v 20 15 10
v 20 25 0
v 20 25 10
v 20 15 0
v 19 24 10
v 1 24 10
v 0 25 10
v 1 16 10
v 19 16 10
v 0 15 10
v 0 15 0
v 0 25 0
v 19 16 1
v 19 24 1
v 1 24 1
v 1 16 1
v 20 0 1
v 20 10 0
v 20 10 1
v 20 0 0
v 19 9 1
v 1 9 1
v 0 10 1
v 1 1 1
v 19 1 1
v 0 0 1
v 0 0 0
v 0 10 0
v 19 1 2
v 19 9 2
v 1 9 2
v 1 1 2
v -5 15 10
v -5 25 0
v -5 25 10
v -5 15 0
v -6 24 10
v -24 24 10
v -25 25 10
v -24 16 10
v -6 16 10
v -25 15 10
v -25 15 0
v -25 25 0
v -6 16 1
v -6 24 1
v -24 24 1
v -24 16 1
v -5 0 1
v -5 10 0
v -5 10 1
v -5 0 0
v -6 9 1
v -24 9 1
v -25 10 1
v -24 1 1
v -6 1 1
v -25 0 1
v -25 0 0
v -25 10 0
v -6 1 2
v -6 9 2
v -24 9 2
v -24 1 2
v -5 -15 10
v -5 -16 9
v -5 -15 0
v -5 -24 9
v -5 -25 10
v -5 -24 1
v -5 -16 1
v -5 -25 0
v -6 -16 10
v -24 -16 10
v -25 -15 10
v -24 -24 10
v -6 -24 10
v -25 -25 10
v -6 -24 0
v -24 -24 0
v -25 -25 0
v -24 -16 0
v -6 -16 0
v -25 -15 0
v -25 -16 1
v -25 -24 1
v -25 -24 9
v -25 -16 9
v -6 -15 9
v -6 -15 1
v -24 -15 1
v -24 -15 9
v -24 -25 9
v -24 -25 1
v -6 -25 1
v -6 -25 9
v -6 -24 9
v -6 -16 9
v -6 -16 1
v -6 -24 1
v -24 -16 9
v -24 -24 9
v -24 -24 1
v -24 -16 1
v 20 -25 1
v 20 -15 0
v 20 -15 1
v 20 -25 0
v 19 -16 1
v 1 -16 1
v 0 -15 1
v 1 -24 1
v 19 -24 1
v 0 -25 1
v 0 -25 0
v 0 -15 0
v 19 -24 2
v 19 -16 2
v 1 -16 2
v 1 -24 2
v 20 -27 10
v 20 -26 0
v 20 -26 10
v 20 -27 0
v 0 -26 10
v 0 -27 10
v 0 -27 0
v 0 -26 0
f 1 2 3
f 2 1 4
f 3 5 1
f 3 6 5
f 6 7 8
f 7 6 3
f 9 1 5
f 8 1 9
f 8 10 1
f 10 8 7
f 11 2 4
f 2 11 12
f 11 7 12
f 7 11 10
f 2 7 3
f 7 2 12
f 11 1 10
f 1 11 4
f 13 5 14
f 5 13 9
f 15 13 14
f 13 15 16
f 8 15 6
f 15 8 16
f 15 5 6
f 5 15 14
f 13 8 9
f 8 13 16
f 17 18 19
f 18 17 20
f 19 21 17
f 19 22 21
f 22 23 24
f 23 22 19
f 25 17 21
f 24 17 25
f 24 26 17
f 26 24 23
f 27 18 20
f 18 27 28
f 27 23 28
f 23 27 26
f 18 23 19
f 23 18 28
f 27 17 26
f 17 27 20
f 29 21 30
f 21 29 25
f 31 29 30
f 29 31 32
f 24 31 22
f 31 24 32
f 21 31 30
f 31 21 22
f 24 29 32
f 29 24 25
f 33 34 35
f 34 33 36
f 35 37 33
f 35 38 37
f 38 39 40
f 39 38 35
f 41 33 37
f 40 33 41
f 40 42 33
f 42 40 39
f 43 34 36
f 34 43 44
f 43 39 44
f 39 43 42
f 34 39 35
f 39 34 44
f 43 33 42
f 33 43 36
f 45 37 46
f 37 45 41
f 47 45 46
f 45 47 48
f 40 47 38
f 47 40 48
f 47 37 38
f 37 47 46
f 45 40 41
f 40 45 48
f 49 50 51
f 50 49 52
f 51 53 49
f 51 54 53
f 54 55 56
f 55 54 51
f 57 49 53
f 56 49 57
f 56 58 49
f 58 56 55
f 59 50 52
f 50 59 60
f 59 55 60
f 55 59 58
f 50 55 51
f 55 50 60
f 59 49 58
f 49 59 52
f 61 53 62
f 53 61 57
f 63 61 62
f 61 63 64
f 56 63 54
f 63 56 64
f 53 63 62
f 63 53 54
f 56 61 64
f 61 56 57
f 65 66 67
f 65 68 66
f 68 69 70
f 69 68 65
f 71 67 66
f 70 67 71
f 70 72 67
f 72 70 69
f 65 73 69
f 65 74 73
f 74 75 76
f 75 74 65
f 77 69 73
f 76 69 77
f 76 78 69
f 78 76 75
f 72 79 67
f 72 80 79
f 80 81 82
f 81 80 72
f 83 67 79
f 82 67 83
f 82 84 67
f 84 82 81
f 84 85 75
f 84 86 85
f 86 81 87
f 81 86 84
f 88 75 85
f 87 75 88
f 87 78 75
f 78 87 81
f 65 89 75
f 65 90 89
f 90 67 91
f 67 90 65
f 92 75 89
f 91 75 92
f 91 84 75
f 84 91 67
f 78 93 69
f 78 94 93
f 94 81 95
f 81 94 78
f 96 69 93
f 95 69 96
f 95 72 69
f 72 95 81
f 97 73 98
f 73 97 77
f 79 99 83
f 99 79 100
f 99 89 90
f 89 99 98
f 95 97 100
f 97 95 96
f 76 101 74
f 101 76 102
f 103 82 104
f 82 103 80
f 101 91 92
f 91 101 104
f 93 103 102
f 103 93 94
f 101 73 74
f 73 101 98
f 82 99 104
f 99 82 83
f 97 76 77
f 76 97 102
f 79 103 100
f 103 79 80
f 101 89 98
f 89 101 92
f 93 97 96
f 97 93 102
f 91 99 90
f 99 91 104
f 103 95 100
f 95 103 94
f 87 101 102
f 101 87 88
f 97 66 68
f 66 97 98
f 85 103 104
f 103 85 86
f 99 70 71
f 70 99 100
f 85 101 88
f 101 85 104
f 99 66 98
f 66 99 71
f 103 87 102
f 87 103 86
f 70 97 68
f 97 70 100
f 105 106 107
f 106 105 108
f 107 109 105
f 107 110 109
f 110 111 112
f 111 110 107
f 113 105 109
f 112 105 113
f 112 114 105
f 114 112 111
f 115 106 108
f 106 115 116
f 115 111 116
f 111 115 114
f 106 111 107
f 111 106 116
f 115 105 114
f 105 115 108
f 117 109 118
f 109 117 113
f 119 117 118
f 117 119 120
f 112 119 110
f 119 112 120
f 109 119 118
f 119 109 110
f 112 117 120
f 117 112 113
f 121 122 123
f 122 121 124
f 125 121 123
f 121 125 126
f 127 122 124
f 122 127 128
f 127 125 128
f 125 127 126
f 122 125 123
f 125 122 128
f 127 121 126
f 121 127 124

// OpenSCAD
/*
Copyright 2018 Michael Gläser

Licensed under the Apache License, Version 2.0 (the "License");
you may not use this file except in compliance with the License.
You may obtain a copy of the License at

    http://www.apache.org/licenses/LICENSE-2.0

Unless required by applicable law or agreed to in writing, software
distributed under the License is distributed on an "AS IS" BASIS,
WITHOUT WARRANTIES OR CONDITIONS OF ANY KIND, either express or implied.
See the License for the specific language governing permissions and
limitations under the License.
*/

/*
Creates a simple box.
*/
module simpleBox01(width=20, depth=10, height=10, wallThickness=1) {
    
    difference() {
        cube([width, depth, height]);
        translate([wallThickness, wallThickness, wallThickness]) {
            cube([
                width-2*wallThickness,
                depth-2*wallThickness,
                height-wallThickness
            ]);
        };
    };
};

/*
Creates the lid that fits to simple box 01.
*/
module lid01(
    width=20,
    depth=10,
    height=1,
    wallThickness=1,
    inlayThickness=1
) {
    cube([width, depth, height]);
    translate([wallThickness, wallThickness, height]) {
        cube([
            width-2*wallThickness,
            depth-2*wallThickness,
            inlayThickness
        ]);
    };
};

/*
Creates a simple box with an inner shell to hold the lid.
*/
module simpleBox02(width=20, depth=10, height=10, wallThickness=1) {
    
    difference() {
        cube([width, depth, height]);
        translate([wallThickness, wallThickness, wallThickness]) {
            cube([
                width-2*wallThickness,
                depth-2*wallThickness,
                height-wallThickness
            ]);
        };
    };
};

/*
Creates the lid that fits to simple box 02.
*/
module lid02(
    width=20,
    depth=10,
    height=1,
    wallThickness=1,
    inlayThickness=1
) {
    cube([width, depth, height]);
    translate([wallThickness, wallThickness, height]) {
        cube([
            width-2*wallThickness,
            depth-2*wallThickness,
            inlayThickness
        ]);
    };
};

module gridBox01(
    width=20,
    depth=10,
    height=10,
    lineThickness=1
) {
    difference() {
        cube([width, depth, height]);
        translate([lineThickness, lineThickness, 0]) {
            cube([
                width-2*lineThickness,
                depth-2*lineThickness,
                height
            ]);
        };
        translate([lineThickness, 0, lineThickness]) {
            cube([
                width-2*lineThickness,
                depth,
                height-2*lineThickness
            ]);
        };
        translate([0, lineThickness, lineThickness]) {
            cube([
                width,
                depth-2*lineThickness,
                height-2*lineThickness
            ]);
        };
    };
};

module assembledBoxLid(
    width=20,
    depth=10,
    height=1,
    wallThickness=1,
    inlayThickness=1
) {
    cube([width, depth, height]);
    translate([wallThickness, wallThickness, height]) {
        cube([
            width-2*wallThickness,
            depth-2*wallThickness,
            inlayThickness
        ]);
    };
};

module assembledBoxFront(
    width=20,
    depth=10,
    height=1,
    wallThickness=1,
    inlayThickness=1
) {
    cube([width, depth, height]);
    translate([wallThickness, wallThickness, height]) {
        cube([
            width-2*wallThickness,
            depth-2*wallThickness,
            inlayThickness
        ]);
    };
};

module assembledBoxSide(
    boxWidth=20,
    boxHeight=10,
    wallThickness=1
) {
    cube([boxWidth, wallThickness, boxHeight]);
};

module assembledBoxBottom(
    width=20,
    depth=10,
    height=1,
    wallThickness=1,
    inlayThickness=1
) {
    cube([width, depth, height]);
    translate([wallThickness, wallThickness, height]) {
        cube([
            width-2*wallThickness,
            depth-2*wallThickness,
            inlayThickness
        ]);
    };
};

module assembledBox(
    boxWidth=20,
    boxLength=10,
    boxHeight=1,
    wallThickness=1,
    bottomThickness=1
    ) {

    // bottom
    assembledBoxBottom();
    
    // front
    
    // back
    
    // left side
    translate([0, -2, 0]) {
        assembledBoxSide();
    };
    
    // right side
    
    // lid
};

module showroom() {
    translate([0,15,0]) {
        simpleBox01();
    };
    lid01();

    translate([-25,0,0]) {
        translate([0,15,0]) {
            simpleBox02();
        };
        lid02();
    };

    translate([-25,-25,0]) {
        gridBox01();
    };
    
    translate([0,-25,0]) {
        assembledBox();
    };
};

showroom();
